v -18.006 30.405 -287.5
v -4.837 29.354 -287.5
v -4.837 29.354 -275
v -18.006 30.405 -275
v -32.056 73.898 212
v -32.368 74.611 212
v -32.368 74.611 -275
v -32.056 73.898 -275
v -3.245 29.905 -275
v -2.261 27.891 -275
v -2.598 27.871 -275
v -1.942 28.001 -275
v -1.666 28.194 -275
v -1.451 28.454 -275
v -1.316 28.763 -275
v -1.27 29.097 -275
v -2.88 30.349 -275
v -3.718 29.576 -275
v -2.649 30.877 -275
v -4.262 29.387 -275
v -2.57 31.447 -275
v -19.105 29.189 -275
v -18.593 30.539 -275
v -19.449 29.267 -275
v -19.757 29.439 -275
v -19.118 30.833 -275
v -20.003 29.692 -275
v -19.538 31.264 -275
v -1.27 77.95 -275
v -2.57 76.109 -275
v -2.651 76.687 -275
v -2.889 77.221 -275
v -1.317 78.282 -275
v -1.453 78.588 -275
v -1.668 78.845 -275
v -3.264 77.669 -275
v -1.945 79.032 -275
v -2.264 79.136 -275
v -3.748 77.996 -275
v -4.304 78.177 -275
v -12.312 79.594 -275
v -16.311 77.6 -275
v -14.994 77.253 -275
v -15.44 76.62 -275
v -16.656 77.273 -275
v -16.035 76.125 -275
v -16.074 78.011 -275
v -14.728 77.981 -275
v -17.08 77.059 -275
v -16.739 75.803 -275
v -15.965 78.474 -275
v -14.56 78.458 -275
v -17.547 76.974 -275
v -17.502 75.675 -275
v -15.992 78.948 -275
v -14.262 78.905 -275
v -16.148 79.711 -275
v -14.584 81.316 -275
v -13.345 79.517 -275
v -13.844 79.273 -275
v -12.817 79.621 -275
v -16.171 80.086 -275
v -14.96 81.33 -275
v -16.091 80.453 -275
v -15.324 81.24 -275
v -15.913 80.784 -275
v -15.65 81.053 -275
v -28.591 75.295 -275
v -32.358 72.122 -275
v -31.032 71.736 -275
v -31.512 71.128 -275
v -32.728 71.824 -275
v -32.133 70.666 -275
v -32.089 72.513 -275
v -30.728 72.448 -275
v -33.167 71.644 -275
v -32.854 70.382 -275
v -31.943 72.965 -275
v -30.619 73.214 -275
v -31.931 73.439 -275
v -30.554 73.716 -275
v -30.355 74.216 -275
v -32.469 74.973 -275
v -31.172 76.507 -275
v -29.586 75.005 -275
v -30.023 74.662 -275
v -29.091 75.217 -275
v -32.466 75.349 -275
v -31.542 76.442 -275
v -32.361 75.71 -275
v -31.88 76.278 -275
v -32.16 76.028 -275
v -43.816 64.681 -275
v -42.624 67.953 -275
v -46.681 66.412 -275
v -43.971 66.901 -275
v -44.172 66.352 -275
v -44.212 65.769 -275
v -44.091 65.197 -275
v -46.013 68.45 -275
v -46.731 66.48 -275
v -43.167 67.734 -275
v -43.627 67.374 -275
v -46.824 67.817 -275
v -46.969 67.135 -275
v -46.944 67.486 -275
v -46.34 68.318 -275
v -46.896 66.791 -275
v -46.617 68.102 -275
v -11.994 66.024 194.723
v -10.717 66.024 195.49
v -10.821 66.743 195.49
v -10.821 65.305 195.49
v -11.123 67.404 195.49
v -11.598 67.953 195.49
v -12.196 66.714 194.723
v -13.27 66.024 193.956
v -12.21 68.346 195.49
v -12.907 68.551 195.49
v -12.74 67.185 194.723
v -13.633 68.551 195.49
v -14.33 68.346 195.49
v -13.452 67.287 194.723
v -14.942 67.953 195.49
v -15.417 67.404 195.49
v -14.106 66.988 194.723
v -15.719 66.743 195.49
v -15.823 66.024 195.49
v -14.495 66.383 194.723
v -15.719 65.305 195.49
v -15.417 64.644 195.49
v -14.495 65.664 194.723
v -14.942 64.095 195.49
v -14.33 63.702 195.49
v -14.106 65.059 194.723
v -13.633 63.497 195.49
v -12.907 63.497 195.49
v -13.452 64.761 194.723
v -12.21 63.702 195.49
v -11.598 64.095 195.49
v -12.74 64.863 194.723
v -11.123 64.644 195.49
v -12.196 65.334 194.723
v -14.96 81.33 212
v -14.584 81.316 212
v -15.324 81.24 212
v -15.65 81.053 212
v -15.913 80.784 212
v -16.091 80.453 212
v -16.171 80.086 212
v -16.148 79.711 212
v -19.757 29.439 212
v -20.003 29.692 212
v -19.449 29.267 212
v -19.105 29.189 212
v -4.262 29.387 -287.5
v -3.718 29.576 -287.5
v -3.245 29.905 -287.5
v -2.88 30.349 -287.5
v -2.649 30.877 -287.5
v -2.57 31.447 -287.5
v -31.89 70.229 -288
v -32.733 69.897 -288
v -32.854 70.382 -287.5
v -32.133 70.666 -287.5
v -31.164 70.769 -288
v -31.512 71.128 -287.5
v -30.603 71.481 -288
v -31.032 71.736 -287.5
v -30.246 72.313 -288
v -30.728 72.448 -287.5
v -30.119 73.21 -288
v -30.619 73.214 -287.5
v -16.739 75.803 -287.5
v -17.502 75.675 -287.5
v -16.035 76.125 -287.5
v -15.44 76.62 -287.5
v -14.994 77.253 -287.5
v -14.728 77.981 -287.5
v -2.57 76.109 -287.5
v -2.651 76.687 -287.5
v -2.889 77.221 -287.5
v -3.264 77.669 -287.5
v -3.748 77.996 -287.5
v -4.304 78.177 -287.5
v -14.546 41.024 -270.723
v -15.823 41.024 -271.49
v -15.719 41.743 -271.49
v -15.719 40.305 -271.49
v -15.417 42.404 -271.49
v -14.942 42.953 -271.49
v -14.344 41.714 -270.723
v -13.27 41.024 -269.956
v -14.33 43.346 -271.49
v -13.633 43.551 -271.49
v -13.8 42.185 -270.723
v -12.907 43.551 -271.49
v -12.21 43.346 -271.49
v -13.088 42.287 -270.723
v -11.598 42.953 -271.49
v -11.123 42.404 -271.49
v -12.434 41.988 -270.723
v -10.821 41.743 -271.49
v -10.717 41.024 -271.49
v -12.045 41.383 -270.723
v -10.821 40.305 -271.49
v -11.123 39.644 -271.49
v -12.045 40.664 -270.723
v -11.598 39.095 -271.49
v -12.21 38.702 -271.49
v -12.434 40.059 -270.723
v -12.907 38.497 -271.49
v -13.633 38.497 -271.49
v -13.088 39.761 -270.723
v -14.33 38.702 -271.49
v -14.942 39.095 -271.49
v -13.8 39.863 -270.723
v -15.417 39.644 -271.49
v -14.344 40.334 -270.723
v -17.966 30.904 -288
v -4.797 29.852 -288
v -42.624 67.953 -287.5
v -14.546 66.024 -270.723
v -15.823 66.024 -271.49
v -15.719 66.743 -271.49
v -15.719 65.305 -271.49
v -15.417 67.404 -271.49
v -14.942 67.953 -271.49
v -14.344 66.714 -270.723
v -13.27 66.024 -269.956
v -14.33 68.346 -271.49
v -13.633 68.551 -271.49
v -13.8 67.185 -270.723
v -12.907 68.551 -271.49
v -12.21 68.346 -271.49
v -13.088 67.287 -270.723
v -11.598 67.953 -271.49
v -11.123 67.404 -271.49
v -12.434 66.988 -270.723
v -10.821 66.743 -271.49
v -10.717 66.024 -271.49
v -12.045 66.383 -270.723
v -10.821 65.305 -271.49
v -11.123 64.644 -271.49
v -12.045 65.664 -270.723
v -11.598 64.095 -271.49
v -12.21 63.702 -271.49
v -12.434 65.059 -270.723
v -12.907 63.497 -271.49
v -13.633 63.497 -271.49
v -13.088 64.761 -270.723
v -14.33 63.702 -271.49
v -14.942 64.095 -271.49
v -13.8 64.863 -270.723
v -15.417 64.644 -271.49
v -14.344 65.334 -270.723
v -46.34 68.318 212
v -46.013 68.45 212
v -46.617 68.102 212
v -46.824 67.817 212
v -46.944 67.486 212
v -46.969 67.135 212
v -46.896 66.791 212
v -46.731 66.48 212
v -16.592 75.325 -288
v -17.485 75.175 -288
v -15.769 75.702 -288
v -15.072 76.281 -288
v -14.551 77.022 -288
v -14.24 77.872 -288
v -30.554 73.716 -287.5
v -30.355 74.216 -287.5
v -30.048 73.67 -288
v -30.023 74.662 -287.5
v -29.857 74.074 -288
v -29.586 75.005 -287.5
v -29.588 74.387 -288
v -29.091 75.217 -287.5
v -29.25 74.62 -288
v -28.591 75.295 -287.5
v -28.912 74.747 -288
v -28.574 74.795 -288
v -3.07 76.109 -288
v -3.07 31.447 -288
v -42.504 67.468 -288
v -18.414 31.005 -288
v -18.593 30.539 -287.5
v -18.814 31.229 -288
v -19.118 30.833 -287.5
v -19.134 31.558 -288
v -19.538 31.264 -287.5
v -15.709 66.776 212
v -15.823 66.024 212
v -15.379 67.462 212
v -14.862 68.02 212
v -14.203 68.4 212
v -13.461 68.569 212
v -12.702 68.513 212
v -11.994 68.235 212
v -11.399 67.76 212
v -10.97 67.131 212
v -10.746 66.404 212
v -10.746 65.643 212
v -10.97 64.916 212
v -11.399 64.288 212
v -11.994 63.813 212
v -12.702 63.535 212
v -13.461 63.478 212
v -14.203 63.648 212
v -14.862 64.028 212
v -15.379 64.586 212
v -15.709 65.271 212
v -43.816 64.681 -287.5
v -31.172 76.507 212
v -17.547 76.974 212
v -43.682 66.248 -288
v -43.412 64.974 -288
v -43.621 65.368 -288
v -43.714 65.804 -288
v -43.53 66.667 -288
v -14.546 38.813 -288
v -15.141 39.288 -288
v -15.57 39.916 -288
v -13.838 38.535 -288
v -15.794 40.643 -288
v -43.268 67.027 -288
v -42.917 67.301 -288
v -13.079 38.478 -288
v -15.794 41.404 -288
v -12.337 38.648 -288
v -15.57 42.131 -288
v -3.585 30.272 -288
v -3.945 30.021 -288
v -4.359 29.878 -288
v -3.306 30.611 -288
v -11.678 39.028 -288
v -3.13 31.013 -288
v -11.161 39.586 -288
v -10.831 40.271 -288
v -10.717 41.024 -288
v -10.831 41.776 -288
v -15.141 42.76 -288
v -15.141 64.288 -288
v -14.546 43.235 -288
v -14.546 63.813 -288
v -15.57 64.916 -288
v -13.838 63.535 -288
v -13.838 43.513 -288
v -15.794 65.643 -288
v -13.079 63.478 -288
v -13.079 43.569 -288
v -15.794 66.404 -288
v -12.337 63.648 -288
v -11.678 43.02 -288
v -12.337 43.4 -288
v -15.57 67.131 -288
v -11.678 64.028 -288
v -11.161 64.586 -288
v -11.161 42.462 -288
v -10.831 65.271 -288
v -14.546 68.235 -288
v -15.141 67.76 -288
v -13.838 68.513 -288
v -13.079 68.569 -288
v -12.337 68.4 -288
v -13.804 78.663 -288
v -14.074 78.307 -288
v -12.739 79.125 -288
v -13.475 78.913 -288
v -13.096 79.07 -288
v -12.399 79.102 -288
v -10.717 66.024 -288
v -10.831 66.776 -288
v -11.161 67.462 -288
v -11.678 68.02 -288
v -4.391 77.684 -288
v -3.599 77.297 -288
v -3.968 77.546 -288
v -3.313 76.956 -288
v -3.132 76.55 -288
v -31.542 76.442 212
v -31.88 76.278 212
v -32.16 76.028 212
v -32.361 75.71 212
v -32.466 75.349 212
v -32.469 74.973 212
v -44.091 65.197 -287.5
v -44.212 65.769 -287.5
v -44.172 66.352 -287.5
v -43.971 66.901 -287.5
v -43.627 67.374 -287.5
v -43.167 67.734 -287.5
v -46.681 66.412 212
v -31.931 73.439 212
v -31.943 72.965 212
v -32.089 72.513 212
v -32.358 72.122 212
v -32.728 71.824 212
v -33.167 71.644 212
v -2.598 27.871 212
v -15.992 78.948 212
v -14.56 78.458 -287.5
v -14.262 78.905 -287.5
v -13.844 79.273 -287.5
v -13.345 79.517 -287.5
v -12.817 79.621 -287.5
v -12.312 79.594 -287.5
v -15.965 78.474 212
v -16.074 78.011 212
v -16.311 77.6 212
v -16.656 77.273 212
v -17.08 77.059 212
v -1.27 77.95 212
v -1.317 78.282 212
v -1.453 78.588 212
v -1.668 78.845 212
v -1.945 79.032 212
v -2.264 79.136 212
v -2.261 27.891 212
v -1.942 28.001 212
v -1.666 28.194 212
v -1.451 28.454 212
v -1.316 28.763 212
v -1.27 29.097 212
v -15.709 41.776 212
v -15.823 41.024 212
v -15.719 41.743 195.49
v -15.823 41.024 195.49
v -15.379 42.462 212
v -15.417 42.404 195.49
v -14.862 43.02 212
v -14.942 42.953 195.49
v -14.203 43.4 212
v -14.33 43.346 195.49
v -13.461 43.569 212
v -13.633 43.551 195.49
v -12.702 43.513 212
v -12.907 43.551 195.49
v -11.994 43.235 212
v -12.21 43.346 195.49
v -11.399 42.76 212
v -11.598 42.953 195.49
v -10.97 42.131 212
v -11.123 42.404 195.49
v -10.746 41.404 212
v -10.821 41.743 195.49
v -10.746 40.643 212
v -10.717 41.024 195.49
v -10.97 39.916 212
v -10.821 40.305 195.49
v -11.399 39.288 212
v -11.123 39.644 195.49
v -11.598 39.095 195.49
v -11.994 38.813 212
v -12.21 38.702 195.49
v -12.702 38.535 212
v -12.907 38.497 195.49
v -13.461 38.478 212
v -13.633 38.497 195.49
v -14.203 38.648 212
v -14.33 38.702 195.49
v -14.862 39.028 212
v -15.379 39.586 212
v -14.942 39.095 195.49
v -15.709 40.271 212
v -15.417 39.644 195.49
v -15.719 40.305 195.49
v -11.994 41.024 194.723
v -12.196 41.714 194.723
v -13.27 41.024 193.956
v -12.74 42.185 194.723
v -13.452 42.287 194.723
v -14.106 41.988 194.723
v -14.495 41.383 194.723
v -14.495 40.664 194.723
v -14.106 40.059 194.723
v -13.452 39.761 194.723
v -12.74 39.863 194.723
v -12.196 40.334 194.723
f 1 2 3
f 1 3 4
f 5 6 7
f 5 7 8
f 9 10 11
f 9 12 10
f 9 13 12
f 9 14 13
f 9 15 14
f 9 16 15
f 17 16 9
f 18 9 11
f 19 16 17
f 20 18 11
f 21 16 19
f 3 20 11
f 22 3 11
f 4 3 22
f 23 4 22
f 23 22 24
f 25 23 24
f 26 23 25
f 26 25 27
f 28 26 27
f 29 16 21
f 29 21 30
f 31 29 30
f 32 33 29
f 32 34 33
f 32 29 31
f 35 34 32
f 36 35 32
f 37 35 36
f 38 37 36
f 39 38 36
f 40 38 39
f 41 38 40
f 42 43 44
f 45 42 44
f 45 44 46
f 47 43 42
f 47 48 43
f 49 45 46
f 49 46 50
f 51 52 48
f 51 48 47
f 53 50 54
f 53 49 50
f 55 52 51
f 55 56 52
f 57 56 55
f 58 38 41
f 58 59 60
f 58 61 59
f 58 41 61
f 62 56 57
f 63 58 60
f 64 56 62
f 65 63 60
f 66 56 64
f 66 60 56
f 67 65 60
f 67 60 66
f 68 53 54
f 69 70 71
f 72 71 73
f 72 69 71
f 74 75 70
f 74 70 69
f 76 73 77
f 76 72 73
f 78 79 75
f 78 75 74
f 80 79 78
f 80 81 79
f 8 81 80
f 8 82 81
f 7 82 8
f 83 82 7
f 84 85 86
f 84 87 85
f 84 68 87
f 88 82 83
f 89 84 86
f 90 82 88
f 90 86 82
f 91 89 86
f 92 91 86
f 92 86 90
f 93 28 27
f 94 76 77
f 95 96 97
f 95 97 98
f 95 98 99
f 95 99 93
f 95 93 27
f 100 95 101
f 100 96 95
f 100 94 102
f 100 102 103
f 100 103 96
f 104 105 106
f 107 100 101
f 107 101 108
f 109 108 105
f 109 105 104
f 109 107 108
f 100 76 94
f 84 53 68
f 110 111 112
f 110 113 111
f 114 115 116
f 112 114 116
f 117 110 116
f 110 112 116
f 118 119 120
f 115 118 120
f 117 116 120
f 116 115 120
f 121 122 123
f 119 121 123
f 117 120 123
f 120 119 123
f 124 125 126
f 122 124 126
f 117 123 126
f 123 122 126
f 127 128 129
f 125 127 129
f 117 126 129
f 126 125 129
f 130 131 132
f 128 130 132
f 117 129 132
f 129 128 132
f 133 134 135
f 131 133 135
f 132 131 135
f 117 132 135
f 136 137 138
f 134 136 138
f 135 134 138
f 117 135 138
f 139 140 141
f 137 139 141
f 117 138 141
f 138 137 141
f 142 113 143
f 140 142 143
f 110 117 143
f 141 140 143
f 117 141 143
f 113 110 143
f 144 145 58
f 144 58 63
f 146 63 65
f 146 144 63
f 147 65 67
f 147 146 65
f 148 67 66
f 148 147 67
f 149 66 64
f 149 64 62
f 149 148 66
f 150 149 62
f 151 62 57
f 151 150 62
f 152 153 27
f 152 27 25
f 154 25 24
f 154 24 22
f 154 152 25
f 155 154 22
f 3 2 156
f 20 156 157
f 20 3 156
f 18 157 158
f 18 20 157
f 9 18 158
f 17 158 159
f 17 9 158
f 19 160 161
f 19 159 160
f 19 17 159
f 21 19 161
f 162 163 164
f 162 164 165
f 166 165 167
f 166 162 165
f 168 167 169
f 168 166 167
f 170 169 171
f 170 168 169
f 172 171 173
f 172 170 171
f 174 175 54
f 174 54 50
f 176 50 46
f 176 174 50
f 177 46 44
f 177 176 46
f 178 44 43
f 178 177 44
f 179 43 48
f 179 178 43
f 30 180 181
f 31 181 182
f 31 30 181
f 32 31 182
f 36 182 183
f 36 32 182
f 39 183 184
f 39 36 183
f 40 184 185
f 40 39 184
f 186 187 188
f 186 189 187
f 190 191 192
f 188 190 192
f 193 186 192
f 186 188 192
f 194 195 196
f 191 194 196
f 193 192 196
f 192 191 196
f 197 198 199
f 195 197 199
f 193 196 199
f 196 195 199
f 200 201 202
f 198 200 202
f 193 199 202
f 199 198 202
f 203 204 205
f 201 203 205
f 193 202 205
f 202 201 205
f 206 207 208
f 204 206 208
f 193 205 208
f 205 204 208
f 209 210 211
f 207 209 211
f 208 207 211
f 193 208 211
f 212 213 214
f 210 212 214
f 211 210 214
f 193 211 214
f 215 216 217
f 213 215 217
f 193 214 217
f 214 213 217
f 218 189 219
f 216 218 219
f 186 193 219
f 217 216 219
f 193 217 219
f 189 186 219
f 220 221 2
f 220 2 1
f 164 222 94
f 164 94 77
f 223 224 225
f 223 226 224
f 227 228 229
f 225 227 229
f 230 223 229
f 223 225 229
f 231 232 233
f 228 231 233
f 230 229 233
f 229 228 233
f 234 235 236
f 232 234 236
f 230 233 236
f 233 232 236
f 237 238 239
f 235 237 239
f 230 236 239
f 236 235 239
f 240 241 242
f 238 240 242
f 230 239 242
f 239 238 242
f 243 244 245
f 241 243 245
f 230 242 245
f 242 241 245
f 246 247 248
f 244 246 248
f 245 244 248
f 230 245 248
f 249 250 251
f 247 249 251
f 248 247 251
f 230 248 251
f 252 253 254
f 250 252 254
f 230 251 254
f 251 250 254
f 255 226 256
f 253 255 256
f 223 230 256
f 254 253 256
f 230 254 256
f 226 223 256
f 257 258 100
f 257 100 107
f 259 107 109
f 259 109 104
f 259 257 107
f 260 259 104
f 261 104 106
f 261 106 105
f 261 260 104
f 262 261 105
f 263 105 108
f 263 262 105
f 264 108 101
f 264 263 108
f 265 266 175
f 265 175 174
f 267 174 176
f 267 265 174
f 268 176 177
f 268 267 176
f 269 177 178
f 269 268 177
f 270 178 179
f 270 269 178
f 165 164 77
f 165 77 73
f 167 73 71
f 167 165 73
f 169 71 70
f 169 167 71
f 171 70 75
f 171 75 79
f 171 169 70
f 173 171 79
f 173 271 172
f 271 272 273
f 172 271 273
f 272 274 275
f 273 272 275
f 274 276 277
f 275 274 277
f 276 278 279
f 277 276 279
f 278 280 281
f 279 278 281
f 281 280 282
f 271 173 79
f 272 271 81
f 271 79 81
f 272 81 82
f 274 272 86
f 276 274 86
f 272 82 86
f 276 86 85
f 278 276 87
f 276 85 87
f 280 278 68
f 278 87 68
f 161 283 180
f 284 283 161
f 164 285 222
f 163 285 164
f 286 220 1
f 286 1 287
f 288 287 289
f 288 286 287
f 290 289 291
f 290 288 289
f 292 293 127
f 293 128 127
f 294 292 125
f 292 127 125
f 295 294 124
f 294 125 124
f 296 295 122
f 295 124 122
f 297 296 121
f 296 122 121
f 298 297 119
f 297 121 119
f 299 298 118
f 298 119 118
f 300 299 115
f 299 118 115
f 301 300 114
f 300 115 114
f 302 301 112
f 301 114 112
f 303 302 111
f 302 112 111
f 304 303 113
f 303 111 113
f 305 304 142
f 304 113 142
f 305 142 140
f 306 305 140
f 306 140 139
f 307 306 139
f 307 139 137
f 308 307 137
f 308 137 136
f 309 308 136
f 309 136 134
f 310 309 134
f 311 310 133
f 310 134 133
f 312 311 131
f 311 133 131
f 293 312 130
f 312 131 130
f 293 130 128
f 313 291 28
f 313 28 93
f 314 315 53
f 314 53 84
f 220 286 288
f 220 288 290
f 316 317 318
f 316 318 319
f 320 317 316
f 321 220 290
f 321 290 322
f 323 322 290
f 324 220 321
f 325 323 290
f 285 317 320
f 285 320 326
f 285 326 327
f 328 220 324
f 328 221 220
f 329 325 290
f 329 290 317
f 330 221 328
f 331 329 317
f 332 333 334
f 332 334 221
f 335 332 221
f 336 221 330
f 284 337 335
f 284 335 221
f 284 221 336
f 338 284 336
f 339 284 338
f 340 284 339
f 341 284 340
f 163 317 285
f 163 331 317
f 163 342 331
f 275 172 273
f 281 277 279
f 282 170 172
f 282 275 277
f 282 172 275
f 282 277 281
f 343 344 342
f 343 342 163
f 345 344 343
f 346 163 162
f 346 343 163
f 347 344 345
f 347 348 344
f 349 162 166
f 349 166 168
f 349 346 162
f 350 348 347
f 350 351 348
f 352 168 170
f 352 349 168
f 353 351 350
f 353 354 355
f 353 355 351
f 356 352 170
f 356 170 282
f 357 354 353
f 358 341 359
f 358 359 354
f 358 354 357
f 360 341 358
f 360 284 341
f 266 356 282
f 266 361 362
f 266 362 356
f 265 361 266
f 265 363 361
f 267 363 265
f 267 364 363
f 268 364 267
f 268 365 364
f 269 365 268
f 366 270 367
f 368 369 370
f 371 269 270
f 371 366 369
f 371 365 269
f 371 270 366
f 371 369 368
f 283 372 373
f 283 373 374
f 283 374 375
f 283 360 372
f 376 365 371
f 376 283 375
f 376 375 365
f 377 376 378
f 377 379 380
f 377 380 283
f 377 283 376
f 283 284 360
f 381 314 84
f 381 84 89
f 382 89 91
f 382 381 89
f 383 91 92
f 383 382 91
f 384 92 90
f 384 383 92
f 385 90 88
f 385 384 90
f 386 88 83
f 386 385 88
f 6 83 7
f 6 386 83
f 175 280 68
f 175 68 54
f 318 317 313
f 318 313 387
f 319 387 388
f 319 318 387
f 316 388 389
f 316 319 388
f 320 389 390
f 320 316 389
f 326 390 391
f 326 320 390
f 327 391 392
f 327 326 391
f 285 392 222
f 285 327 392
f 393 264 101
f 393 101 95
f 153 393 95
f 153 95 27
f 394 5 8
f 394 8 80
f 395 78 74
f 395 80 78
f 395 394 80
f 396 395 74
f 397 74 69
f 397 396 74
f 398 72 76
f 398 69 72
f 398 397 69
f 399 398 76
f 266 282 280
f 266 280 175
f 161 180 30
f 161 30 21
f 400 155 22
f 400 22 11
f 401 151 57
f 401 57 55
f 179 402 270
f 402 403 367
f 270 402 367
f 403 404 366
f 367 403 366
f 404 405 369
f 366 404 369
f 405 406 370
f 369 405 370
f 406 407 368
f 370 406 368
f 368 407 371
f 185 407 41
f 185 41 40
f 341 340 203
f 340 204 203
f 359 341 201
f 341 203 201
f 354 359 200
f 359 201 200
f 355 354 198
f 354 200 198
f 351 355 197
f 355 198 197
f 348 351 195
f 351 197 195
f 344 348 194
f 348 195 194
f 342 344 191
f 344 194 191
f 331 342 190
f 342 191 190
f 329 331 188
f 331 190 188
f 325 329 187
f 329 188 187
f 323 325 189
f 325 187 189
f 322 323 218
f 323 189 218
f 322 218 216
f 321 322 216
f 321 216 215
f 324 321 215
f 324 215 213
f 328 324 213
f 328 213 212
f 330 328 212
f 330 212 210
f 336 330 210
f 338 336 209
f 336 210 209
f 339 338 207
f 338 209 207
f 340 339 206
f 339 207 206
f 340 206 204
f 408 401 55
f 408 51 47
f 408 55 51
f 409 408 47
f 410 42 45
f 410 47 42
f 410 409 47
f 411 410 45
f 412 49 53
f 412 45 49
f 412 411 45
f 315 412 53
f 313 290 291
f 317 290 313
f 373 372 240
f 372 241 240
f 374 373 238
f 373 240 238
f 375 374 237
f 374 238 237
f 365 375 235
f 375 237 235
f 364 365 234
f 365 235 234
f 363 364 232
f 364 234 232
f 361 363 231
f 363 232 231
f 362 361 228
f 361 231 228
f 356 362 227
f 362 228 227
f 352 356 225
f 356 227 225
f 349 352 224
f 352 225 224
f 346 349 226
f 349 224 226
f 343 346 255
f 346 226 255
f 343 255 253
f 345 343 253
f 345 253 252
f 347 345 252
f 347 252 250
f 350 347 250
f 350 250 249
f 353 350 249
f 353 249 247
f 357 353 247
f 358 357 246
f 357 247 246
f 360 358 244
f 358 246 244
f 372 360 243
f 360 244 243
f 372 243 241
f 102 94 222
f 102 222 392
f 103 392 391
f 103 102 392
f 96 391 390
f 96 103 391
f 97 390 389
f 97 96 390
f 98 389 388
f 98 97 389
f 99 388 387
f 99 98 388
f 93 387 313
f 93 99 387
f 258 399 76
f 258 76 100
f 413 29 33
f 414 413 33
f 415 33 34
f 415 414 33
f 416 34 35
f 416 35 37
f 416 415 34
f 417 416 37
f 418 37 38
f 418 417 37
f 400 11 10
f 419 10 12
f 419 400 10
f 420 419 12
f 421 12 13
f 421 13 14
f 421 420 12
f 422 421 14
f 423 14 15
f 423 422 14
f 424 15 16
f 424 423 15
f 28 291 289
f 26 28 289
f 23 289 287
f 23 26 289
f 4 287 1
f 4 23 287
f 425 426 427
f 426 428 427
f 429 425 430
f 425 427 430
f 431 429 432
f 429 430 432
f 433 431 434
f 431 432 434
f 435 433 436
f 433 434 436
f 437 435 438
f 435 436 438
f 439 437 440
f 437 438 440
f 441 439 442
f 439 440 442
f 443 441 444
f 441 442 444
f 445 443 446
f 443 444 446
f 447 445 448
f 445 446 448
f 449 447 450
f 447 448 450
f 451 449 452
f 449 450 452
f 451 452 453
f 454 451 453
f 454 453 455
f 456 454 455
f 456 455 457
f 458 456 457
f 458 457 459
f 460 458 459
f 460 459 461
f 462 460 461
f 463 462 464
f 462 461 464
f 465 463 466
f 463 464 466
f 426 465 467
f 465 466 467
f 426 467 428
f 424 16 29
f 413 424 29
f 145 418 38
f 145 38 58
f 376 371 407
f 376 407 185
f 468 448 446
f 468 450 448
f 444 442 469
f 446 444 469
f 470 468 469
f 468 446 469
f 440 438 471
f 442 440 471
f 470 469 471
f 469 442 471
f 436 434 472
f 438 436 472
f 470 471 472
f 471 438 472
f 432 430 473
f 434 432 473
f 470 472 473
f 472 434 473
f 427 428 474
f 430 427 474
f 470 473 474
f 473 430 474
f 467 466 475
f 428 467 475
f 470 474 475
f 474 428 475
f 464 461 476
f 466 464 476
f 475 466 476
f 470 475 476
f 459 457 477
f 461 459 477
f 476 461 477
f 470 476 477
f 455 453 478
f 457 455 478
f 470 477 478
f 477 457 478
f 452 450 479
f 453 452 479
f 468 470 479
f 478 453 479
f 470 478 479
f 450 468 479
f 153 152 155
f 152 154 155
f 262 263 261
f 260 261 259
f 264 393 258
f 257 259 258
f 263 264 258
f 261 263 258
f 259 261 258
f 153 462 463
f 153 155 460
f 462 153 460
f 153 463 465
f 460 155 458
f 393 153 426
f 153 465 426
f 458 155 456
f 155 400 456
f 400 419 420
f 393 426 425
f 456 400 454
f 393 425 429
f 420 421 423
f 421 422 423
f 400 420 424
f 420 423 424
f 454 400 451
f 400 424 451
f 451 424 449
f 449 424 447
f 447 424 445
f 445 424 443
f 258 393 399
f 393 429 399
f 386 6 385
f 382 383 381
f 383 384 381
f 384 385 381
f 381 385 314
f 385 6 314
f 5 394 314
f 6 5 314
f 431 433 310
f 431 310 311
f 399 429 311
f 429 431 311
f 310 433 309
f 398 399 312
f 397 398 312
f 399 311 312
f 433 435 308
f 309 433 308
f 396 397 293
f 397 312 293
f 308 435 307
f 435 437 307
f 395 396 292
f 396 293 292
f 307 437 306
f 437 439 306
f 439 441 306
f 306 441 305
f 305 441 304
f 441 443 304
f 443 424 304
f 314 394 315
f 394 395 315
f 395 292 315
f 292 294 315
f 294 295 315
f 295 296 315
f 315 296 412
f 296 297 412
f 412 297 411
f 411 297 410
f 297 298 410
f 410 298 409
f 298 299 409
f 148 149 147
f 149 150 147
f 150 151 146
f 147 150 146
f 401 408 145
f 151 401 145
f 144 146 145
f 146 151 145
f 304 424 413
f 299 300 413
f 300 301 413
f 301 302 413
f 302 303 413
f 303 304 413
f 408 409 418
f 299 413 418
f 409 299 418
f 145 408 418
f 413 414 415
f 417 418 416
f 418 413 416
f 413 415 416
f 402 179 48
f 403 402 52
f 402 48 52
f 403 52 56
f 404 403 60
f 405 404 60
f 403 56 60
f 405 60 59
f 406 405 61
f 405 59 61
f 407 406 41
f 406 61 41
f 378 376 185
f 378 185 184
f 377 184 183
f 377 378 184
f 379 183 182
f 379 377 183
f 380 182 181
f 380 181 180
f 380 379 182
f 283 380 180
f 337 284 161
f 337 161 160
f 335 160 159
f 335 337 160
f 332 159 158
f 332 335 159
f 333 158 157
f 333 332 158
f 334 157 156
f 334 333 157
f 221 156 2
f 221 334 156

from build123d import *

# Parameters (mm, degrees)
EXTRUDE_THIN1_DEPTH                   = 137.50025
EXTRUDE_THIN1_DEPTH_BACK              = 213.5
BOSS_EXTRUDE1_DEPTH                   = 212.50025
BOSS_EXTRUDE1_DEPTH_BACK              = 288.5
SKETCH3_OUTSIDE_W                     = 604.182
SKETCH3_OUTSIDE_H                     = 156.652
SKETCH3_OUTSIDE_W_2                   = 500
SKETCH3_OUTSIDE_H_2                   = 100
CUT_EXTRUDE1_DEPTH                    = 47.972186303
F_1_4_20_TAPPED_HOLE1_D               = 5.1054
F_1_4_20_TAPPED_HOLE1_DEPTH           = 16.51
F_1_4_20_TAPPED_HOLE1_TIP             = 1.533816902
F_1_4_20_TAPPED_HOLE1_ON_FACE_2_D     = 5.1054
F_1_4_20_TAPPED_HOLE1_ON_FACE_2_DEPTH = 16.51
F_1_4_20_TAPPED_HOLE1_ON_FACE_2_TIP   = 1.533816902
SKETCH5_OUTSIDE_W                     = 148.686
SKETCH5_OUTSIDE_H                     = 156.454
CUT_EXTRUDE2_DEPTH                    = 13
FILLET3_R                             = 2.1
FILLET4_R                             = 2.1
CHAMFER1_SIZE                         = 0.5


with BuildPart() as part:
    # Sketch1 → Extrude-Thin1 (new body, two sides)
    with BuildSketch(Plane.XY) as extrude_thin1_sk:
        with BuildLine():
            Line((-1, 29.097280522), (-1, 77.801426037))
            ThreePointArc((-1, 77.801426037), (-1.350622843, 78.7652373), (-2.238576202, 79.27846957))
            Line((-2.238576202, 79.27846957), (-14.558703222, 81.459024393))
            ThreePointArc((-14.558703222, 81.459024393), (-15.894736772, 81.028505528), (-16.289731153, 79.68154169))
            Line((-16.289731153, 79.68154169), (-16.133756175, 78.918587006))
            ThreePointArc((-16.133756175, 78.918587006), (-16.425245764, 77.689683446), (-17.55197675, 77.119028185))
            Line((-17.55197675, 77.119028185), (-31.176844121, 76.652024665))
            ThreePointArc((-31.176844121, 76.652024665), (-32.394172227, 75.953136676), (-32.500485503, 74.55348328))
            Line((-32.500485503, 74.55348328), (-32.189291755, 73.839630008))
            ThreePointArc((-32.189291755, 73.839630008), (-32.21890818, 72.576976846), (-33.20237149, 71.784531227))
            Line((-33.20237149, 71.784531227), (-46.048094305, 68.590520727))
            ThreePointArc((-46.048094305, 68.590520727), (-47.095522717, 67.648327863), (-46.899674591, 66.2531658))
            Line((-46.899674591, 66.2531658), (-20.221033316, 29.533166286))
            ThreePointArc((-20.221033316, 29.533166286), (-19.7411642, 29.106506164), (-19.126852316, 28.919599404))
            Line((-19.126852316, 28.919599404), (-2.619344492, 27.602035762))
            ThreePointArc((-2.619344492, 27.602035762), (-1.482408908, 27.995233168), (-1, 29.097280522))
        make_face()
        with BuildLine():
            Line((-1.27, 29.097280522), (-1.27, 77.801426037))
            ThreePointArc((-1.27, 77.801426037), (-1.557510731, 78.591751273), (-2.285632486, 79.012601734))
            Line((-2.285632486, 79.012601734), (-14.605759506, 81.193156557))
            ThreePointArc((-14.605759506, 81.193156557), (-15.701307017, 80.840131088), (-16.025202409, 79.735620741))
            Line((-16.025202409, 79.735620741), (-15.869227431, 78.972666057))
            ThreePointArc((-15.869227431, 78.972666057), (-16.213185147, 77.522559856), (-17.542727709, 76.849186648))
            Line((-17.542727709, 76.849186648), (-31.16759508, 76.382183127))
            ThreePointArc((-31.16759508, 76.382183127), (-32.165804128, 75.809094976), (-32.252981014, 74.661379192))
            Line((-32.252981014, 74.661379192), (-31.941787266, 73.94752592))
            ThreePointArc((-31.941787266, 73.94752592), (-31.976734648, 72.457595189), (-33.137221353, 71.522509358))
            Line((-33.137221353, 71.522509358), (-45.982944168, 68.328498858))
            ThreePointArc((-45.982944168, 68.328498858), (-46.841835466, 67.55590071), (-46.681240003, 66.411867819))
            Line((-46.681240003, 66.411867819), (-20.002598727, 29.691868304))
            ThreePointArc((-20.002598727, 29.691868304), (-19.609106053, 29.342007004), (-19.105370308, 29.188743461))
            Line((-19.105370308, 29.188743461), (-2.597862483, 27.871179818))
            ThreePointArc((-2.597862483, 27.871179818), (-1.665575304, 28.193601692), (-1.27, 29.097280522))
        make_face(mode=Mode.SUBTRACT)
    extrude(amount=EXTRUDE_THIN1_DEPTH)
    extrude(extrude_thin1_sk.sketch, amount=-EXTRUDE_THIN1_DEPTH_BACK)


with BuildPart() as body_2:
    # Sketch2 → Boss-Extrude1 (new body, two sides)
    with BuildSketch(Plane.XY) as boss_extrude1_sk:
        with BuildLine():
            Line((-46.68124, 66.411867814), (-20.002598727, 29.691868304))
            ThreePointArc((-20.002598727, 29.691868304), (-19.609106053, 29.342007004), (-19.105370308, 29.188743461))
            Line((-19.105370308, 29.188743461), (-2.597862483, 27.871179818))
            ThreePointArc((-2.597862483, 27.871179818), (-1.665575304, 28.193601692), (-1.27, 29.097280522))
            Line((-1.27, 29.097280522), (-1.27, 77.801426032))
            Line((-1.27, 77.801426032), (-1.27, 77.950492716))
            ThreePointArc((-1.27, 77.950492716), (-1.551343626, 78.723865476), (-2.263847169, 79.135688695))
            Line((-2.263847169, 79.135688695), (-14.583974189, 81.316243518))
            ThreePointArc((-14.583974189, 81.316243518), (-15.79085783, 80.927341477), (-16.14766942, 79.710584143))
            Line((-16.14766942, 79.710584143), (-15.991694442, 78.947629459))
            ThreePointArc((-15.991694442, 78.947629459), (-16.311361359, 77.599931889), (-17.547009673, 76.974113285))
            Line((-17.547009673, 76.974113285), (-31.171877043, 76.507109765))
            ThreePointArc((-31.171877043, 76.507109765), (-32.271530099, 75.875780948), (-32.367566426, 74.611427381))
            Line((-32.367566426, 74.611427381), (-32.056372677, 73.897574109))
            ThreePointArc((-32.056372677, 73.897574109), (-32.088852024, 72.512864474), (-33.167383454, 71.643815779))
            Line((-33.167383454, 71.643815779), (-46.013106268, 68.449805279))
            ThreePointArc((-46.013106268, 68.449805279), (-46.895812164, 67.655785195), (-46.730763849, 66.480031545))
            Line((-46.730763849, 66.480031545), (-46.68124, 66.411867814))
        make_face()
    extrude(amount=BOSS_EXTRUDE1_DEPTH)
    extrude(boss_extrude1_sk.sketch, amount=-BOSS_EXTRUDE1_DEPTH_BACK)

    # Sketch3 outside → Cut-Extrude1 (cut, through all)
    with BuildSketch(Plane(origin=(0, 0, 0), x_dir=(0, 0, -1), z_dir=(1, 0, 0))):
        with Locations((38, 54.602)):
            Rectangle(SKETCH3_OUTSIDE_W, SKETCH3_OUTSIDE_H)
        with Locations((37.999875, 53.523886616)):
            Rectangle(SKETCH3_OUTSIDE_W_2, SKETCH3_OUTSIDE_H_2, mode=Mode.SUBTRACT)
    extrude(amount=-CUT_EXTRUDE1_DEPTH, mode=Mode.SUBTRACT)

    # 1/4-20 Tapped Hole1
    with Locations(Plane(origin=(-13.27, 66.023886616, 212.000125), x_dir=(1, 0, 0), z_dir=(0, 0, 1))):
        with Locations((0, 0), (0, -25)):
            Hole(F_1_4_20_TAPPED_HOLE1_D / 2, depth=F_1_4_20_TAPPED_HOLE1_DEPTH)
            with Locations((0, 0, -(F_1_4_20_TAPPED_HOLE1_DEPTH + F_1_4_20_TAPPED_HOLE1_TIP / 2))):  # 118° drill point
                Cone(0, F_1_4_20_TAPPED_HOLE1_D / 2, F_1_4_20_TAPPED_HOLE1_TIP, mode=Mode.SUBTRACT)

    # 1/4-20 Tapped Hole1 on face 2
    with Locations(Plane(origin=(-13.27, 66.023886616, -287.999875), x_dir=(-1, 0, 0), z_dir=(0, 0, -1))):
        with Locations((0, 0), (0, -25)):
            Hole(F_1_4_20_TAPPED_HOLE1_ON_FACE_2_D / 2, depth=F_1_4_20_TAPPED_HOLE1_ON_FACE_2_DEPTH)
            with Locations((0, 0, -(F_1_4_20_TAPPED_HOLE1_ON_FACE_2_DEPTH + F_1_4_20_TAPPED_HOLE1_ON_FACE_2_TIP / 2))):  # 118° drill point
                Cone(0, F_1_4_20_TAPPED_HOLE1_ON_FACE_2_D / 2, F_1_4_20_TAPPED_HOLE1_ON_FACE_2_TIP, mode=Mode.SUBTRACT)

    # Sketch5 outside → Cut-Extrude2 (cut)
    with BuildSketch(Plane(origin=(0, 0, -287.999875), x_dir=(-1, 0, 0), z_dir=(0, 0, -1))):
        with Locations((24.121, 54.602)):
            Rectangle(SKETCH5_OUTSIDE_W, SKETCH5_OUTSIDE_H)
        with BuildLine():
            Line((2.57, 29.17309026), (18.969817109, 30.482058458))
            Line((18.969817109, 30.482058458), (45.647739584, 67.201068629))
            Line((45.647739584, 67.201068629), (32.853697609, 70.382229004))
            ThreePointArc((32.853697609, 70.382229004), (30.922831311, 71.938063902), (30.864684396, 74.417072944))
            Line((30.864684396, 74.417072944), (31.208213492, 75.205100887))
            Line((31.208213492, 75.205100887), (17.502477256, 75.674876254))
            ThreePointArc((17.502477256, 75.674876254), (15.290328755, 76.79526275), (14.718037528, 79.208010073))
            Line((14.718037528, 79.208010073), (14.890219467, 80.05024143))
            Line((14.890219467, 80.05024143), (2.57, 77.869670245))
            Line((2.57, 77.869670245), (2.57, 29.17309026))
        make_face(mode=Mode.SUBTRACT)
    extrude(amount=-CUT_EXTRUDE2_DEPTH, mode=Mode.SUBTRACT)

    # Fillet3
    fillet3_edges = [body_2.edges().sort_by_distance(p)[0] for p in [
        (-31.208213492, 75.205100887, -281.499875),
    ]]
    fillet(fillet3_edges, radius=FILLET3_R)

    # Fillet4
    fillet4_edges = [body_2.edges().sort_by_distance(p)[0] for p in [
        (-2.57, 29.17309026, -281.499875),
        (-18.969817109, 30.482058458, -281.499875),
        (-2.57, 77.869670245, -281.499875),
        (-45.647739584, 67.201068629, -281.499875),
        (-14.890219467, 80.05024143, -281.499875),
    ]]
    fillet(fillet4_edges, radius=FILLET4_R)

    # Chamfer1
    chamfer1_edges = [body_2.edges().sort_by_distance(p)[0] for p in [
        (-15.720977232, 76.353272794, -287.999875),
        (-31.252174207, 71.416195634, -287.999875),
        (-23.046962204, 75.484834478, -287.999875),
        (-30.023249286, 74.661893082, -287.999875),
        (-2.57, 53.778047874, -287.999875),
        (-8.307997228, 78.885245613, -287.999875),
        (-11.421630112, 29.879592183, -287.999875),
        (-31.677250598, 47.972340168, -287.999875),
        (-37.738977535, 69.167533996, -287.999875),
        (-13.844088825, 79.272536107, -287.999875),
        (-44.090657237, 66.633768979, -287.999875),
        (-3.06087198, 77.458049098, -287.999875),
        (-18.866214572, 30.666814075, -287.999875),
        (-3.245372471, 29.904516124, -287.999875),
    ]]
    chamfer(chamfer1_edges, length=CHAMFER1_SIZE)


solid = body_2.part
